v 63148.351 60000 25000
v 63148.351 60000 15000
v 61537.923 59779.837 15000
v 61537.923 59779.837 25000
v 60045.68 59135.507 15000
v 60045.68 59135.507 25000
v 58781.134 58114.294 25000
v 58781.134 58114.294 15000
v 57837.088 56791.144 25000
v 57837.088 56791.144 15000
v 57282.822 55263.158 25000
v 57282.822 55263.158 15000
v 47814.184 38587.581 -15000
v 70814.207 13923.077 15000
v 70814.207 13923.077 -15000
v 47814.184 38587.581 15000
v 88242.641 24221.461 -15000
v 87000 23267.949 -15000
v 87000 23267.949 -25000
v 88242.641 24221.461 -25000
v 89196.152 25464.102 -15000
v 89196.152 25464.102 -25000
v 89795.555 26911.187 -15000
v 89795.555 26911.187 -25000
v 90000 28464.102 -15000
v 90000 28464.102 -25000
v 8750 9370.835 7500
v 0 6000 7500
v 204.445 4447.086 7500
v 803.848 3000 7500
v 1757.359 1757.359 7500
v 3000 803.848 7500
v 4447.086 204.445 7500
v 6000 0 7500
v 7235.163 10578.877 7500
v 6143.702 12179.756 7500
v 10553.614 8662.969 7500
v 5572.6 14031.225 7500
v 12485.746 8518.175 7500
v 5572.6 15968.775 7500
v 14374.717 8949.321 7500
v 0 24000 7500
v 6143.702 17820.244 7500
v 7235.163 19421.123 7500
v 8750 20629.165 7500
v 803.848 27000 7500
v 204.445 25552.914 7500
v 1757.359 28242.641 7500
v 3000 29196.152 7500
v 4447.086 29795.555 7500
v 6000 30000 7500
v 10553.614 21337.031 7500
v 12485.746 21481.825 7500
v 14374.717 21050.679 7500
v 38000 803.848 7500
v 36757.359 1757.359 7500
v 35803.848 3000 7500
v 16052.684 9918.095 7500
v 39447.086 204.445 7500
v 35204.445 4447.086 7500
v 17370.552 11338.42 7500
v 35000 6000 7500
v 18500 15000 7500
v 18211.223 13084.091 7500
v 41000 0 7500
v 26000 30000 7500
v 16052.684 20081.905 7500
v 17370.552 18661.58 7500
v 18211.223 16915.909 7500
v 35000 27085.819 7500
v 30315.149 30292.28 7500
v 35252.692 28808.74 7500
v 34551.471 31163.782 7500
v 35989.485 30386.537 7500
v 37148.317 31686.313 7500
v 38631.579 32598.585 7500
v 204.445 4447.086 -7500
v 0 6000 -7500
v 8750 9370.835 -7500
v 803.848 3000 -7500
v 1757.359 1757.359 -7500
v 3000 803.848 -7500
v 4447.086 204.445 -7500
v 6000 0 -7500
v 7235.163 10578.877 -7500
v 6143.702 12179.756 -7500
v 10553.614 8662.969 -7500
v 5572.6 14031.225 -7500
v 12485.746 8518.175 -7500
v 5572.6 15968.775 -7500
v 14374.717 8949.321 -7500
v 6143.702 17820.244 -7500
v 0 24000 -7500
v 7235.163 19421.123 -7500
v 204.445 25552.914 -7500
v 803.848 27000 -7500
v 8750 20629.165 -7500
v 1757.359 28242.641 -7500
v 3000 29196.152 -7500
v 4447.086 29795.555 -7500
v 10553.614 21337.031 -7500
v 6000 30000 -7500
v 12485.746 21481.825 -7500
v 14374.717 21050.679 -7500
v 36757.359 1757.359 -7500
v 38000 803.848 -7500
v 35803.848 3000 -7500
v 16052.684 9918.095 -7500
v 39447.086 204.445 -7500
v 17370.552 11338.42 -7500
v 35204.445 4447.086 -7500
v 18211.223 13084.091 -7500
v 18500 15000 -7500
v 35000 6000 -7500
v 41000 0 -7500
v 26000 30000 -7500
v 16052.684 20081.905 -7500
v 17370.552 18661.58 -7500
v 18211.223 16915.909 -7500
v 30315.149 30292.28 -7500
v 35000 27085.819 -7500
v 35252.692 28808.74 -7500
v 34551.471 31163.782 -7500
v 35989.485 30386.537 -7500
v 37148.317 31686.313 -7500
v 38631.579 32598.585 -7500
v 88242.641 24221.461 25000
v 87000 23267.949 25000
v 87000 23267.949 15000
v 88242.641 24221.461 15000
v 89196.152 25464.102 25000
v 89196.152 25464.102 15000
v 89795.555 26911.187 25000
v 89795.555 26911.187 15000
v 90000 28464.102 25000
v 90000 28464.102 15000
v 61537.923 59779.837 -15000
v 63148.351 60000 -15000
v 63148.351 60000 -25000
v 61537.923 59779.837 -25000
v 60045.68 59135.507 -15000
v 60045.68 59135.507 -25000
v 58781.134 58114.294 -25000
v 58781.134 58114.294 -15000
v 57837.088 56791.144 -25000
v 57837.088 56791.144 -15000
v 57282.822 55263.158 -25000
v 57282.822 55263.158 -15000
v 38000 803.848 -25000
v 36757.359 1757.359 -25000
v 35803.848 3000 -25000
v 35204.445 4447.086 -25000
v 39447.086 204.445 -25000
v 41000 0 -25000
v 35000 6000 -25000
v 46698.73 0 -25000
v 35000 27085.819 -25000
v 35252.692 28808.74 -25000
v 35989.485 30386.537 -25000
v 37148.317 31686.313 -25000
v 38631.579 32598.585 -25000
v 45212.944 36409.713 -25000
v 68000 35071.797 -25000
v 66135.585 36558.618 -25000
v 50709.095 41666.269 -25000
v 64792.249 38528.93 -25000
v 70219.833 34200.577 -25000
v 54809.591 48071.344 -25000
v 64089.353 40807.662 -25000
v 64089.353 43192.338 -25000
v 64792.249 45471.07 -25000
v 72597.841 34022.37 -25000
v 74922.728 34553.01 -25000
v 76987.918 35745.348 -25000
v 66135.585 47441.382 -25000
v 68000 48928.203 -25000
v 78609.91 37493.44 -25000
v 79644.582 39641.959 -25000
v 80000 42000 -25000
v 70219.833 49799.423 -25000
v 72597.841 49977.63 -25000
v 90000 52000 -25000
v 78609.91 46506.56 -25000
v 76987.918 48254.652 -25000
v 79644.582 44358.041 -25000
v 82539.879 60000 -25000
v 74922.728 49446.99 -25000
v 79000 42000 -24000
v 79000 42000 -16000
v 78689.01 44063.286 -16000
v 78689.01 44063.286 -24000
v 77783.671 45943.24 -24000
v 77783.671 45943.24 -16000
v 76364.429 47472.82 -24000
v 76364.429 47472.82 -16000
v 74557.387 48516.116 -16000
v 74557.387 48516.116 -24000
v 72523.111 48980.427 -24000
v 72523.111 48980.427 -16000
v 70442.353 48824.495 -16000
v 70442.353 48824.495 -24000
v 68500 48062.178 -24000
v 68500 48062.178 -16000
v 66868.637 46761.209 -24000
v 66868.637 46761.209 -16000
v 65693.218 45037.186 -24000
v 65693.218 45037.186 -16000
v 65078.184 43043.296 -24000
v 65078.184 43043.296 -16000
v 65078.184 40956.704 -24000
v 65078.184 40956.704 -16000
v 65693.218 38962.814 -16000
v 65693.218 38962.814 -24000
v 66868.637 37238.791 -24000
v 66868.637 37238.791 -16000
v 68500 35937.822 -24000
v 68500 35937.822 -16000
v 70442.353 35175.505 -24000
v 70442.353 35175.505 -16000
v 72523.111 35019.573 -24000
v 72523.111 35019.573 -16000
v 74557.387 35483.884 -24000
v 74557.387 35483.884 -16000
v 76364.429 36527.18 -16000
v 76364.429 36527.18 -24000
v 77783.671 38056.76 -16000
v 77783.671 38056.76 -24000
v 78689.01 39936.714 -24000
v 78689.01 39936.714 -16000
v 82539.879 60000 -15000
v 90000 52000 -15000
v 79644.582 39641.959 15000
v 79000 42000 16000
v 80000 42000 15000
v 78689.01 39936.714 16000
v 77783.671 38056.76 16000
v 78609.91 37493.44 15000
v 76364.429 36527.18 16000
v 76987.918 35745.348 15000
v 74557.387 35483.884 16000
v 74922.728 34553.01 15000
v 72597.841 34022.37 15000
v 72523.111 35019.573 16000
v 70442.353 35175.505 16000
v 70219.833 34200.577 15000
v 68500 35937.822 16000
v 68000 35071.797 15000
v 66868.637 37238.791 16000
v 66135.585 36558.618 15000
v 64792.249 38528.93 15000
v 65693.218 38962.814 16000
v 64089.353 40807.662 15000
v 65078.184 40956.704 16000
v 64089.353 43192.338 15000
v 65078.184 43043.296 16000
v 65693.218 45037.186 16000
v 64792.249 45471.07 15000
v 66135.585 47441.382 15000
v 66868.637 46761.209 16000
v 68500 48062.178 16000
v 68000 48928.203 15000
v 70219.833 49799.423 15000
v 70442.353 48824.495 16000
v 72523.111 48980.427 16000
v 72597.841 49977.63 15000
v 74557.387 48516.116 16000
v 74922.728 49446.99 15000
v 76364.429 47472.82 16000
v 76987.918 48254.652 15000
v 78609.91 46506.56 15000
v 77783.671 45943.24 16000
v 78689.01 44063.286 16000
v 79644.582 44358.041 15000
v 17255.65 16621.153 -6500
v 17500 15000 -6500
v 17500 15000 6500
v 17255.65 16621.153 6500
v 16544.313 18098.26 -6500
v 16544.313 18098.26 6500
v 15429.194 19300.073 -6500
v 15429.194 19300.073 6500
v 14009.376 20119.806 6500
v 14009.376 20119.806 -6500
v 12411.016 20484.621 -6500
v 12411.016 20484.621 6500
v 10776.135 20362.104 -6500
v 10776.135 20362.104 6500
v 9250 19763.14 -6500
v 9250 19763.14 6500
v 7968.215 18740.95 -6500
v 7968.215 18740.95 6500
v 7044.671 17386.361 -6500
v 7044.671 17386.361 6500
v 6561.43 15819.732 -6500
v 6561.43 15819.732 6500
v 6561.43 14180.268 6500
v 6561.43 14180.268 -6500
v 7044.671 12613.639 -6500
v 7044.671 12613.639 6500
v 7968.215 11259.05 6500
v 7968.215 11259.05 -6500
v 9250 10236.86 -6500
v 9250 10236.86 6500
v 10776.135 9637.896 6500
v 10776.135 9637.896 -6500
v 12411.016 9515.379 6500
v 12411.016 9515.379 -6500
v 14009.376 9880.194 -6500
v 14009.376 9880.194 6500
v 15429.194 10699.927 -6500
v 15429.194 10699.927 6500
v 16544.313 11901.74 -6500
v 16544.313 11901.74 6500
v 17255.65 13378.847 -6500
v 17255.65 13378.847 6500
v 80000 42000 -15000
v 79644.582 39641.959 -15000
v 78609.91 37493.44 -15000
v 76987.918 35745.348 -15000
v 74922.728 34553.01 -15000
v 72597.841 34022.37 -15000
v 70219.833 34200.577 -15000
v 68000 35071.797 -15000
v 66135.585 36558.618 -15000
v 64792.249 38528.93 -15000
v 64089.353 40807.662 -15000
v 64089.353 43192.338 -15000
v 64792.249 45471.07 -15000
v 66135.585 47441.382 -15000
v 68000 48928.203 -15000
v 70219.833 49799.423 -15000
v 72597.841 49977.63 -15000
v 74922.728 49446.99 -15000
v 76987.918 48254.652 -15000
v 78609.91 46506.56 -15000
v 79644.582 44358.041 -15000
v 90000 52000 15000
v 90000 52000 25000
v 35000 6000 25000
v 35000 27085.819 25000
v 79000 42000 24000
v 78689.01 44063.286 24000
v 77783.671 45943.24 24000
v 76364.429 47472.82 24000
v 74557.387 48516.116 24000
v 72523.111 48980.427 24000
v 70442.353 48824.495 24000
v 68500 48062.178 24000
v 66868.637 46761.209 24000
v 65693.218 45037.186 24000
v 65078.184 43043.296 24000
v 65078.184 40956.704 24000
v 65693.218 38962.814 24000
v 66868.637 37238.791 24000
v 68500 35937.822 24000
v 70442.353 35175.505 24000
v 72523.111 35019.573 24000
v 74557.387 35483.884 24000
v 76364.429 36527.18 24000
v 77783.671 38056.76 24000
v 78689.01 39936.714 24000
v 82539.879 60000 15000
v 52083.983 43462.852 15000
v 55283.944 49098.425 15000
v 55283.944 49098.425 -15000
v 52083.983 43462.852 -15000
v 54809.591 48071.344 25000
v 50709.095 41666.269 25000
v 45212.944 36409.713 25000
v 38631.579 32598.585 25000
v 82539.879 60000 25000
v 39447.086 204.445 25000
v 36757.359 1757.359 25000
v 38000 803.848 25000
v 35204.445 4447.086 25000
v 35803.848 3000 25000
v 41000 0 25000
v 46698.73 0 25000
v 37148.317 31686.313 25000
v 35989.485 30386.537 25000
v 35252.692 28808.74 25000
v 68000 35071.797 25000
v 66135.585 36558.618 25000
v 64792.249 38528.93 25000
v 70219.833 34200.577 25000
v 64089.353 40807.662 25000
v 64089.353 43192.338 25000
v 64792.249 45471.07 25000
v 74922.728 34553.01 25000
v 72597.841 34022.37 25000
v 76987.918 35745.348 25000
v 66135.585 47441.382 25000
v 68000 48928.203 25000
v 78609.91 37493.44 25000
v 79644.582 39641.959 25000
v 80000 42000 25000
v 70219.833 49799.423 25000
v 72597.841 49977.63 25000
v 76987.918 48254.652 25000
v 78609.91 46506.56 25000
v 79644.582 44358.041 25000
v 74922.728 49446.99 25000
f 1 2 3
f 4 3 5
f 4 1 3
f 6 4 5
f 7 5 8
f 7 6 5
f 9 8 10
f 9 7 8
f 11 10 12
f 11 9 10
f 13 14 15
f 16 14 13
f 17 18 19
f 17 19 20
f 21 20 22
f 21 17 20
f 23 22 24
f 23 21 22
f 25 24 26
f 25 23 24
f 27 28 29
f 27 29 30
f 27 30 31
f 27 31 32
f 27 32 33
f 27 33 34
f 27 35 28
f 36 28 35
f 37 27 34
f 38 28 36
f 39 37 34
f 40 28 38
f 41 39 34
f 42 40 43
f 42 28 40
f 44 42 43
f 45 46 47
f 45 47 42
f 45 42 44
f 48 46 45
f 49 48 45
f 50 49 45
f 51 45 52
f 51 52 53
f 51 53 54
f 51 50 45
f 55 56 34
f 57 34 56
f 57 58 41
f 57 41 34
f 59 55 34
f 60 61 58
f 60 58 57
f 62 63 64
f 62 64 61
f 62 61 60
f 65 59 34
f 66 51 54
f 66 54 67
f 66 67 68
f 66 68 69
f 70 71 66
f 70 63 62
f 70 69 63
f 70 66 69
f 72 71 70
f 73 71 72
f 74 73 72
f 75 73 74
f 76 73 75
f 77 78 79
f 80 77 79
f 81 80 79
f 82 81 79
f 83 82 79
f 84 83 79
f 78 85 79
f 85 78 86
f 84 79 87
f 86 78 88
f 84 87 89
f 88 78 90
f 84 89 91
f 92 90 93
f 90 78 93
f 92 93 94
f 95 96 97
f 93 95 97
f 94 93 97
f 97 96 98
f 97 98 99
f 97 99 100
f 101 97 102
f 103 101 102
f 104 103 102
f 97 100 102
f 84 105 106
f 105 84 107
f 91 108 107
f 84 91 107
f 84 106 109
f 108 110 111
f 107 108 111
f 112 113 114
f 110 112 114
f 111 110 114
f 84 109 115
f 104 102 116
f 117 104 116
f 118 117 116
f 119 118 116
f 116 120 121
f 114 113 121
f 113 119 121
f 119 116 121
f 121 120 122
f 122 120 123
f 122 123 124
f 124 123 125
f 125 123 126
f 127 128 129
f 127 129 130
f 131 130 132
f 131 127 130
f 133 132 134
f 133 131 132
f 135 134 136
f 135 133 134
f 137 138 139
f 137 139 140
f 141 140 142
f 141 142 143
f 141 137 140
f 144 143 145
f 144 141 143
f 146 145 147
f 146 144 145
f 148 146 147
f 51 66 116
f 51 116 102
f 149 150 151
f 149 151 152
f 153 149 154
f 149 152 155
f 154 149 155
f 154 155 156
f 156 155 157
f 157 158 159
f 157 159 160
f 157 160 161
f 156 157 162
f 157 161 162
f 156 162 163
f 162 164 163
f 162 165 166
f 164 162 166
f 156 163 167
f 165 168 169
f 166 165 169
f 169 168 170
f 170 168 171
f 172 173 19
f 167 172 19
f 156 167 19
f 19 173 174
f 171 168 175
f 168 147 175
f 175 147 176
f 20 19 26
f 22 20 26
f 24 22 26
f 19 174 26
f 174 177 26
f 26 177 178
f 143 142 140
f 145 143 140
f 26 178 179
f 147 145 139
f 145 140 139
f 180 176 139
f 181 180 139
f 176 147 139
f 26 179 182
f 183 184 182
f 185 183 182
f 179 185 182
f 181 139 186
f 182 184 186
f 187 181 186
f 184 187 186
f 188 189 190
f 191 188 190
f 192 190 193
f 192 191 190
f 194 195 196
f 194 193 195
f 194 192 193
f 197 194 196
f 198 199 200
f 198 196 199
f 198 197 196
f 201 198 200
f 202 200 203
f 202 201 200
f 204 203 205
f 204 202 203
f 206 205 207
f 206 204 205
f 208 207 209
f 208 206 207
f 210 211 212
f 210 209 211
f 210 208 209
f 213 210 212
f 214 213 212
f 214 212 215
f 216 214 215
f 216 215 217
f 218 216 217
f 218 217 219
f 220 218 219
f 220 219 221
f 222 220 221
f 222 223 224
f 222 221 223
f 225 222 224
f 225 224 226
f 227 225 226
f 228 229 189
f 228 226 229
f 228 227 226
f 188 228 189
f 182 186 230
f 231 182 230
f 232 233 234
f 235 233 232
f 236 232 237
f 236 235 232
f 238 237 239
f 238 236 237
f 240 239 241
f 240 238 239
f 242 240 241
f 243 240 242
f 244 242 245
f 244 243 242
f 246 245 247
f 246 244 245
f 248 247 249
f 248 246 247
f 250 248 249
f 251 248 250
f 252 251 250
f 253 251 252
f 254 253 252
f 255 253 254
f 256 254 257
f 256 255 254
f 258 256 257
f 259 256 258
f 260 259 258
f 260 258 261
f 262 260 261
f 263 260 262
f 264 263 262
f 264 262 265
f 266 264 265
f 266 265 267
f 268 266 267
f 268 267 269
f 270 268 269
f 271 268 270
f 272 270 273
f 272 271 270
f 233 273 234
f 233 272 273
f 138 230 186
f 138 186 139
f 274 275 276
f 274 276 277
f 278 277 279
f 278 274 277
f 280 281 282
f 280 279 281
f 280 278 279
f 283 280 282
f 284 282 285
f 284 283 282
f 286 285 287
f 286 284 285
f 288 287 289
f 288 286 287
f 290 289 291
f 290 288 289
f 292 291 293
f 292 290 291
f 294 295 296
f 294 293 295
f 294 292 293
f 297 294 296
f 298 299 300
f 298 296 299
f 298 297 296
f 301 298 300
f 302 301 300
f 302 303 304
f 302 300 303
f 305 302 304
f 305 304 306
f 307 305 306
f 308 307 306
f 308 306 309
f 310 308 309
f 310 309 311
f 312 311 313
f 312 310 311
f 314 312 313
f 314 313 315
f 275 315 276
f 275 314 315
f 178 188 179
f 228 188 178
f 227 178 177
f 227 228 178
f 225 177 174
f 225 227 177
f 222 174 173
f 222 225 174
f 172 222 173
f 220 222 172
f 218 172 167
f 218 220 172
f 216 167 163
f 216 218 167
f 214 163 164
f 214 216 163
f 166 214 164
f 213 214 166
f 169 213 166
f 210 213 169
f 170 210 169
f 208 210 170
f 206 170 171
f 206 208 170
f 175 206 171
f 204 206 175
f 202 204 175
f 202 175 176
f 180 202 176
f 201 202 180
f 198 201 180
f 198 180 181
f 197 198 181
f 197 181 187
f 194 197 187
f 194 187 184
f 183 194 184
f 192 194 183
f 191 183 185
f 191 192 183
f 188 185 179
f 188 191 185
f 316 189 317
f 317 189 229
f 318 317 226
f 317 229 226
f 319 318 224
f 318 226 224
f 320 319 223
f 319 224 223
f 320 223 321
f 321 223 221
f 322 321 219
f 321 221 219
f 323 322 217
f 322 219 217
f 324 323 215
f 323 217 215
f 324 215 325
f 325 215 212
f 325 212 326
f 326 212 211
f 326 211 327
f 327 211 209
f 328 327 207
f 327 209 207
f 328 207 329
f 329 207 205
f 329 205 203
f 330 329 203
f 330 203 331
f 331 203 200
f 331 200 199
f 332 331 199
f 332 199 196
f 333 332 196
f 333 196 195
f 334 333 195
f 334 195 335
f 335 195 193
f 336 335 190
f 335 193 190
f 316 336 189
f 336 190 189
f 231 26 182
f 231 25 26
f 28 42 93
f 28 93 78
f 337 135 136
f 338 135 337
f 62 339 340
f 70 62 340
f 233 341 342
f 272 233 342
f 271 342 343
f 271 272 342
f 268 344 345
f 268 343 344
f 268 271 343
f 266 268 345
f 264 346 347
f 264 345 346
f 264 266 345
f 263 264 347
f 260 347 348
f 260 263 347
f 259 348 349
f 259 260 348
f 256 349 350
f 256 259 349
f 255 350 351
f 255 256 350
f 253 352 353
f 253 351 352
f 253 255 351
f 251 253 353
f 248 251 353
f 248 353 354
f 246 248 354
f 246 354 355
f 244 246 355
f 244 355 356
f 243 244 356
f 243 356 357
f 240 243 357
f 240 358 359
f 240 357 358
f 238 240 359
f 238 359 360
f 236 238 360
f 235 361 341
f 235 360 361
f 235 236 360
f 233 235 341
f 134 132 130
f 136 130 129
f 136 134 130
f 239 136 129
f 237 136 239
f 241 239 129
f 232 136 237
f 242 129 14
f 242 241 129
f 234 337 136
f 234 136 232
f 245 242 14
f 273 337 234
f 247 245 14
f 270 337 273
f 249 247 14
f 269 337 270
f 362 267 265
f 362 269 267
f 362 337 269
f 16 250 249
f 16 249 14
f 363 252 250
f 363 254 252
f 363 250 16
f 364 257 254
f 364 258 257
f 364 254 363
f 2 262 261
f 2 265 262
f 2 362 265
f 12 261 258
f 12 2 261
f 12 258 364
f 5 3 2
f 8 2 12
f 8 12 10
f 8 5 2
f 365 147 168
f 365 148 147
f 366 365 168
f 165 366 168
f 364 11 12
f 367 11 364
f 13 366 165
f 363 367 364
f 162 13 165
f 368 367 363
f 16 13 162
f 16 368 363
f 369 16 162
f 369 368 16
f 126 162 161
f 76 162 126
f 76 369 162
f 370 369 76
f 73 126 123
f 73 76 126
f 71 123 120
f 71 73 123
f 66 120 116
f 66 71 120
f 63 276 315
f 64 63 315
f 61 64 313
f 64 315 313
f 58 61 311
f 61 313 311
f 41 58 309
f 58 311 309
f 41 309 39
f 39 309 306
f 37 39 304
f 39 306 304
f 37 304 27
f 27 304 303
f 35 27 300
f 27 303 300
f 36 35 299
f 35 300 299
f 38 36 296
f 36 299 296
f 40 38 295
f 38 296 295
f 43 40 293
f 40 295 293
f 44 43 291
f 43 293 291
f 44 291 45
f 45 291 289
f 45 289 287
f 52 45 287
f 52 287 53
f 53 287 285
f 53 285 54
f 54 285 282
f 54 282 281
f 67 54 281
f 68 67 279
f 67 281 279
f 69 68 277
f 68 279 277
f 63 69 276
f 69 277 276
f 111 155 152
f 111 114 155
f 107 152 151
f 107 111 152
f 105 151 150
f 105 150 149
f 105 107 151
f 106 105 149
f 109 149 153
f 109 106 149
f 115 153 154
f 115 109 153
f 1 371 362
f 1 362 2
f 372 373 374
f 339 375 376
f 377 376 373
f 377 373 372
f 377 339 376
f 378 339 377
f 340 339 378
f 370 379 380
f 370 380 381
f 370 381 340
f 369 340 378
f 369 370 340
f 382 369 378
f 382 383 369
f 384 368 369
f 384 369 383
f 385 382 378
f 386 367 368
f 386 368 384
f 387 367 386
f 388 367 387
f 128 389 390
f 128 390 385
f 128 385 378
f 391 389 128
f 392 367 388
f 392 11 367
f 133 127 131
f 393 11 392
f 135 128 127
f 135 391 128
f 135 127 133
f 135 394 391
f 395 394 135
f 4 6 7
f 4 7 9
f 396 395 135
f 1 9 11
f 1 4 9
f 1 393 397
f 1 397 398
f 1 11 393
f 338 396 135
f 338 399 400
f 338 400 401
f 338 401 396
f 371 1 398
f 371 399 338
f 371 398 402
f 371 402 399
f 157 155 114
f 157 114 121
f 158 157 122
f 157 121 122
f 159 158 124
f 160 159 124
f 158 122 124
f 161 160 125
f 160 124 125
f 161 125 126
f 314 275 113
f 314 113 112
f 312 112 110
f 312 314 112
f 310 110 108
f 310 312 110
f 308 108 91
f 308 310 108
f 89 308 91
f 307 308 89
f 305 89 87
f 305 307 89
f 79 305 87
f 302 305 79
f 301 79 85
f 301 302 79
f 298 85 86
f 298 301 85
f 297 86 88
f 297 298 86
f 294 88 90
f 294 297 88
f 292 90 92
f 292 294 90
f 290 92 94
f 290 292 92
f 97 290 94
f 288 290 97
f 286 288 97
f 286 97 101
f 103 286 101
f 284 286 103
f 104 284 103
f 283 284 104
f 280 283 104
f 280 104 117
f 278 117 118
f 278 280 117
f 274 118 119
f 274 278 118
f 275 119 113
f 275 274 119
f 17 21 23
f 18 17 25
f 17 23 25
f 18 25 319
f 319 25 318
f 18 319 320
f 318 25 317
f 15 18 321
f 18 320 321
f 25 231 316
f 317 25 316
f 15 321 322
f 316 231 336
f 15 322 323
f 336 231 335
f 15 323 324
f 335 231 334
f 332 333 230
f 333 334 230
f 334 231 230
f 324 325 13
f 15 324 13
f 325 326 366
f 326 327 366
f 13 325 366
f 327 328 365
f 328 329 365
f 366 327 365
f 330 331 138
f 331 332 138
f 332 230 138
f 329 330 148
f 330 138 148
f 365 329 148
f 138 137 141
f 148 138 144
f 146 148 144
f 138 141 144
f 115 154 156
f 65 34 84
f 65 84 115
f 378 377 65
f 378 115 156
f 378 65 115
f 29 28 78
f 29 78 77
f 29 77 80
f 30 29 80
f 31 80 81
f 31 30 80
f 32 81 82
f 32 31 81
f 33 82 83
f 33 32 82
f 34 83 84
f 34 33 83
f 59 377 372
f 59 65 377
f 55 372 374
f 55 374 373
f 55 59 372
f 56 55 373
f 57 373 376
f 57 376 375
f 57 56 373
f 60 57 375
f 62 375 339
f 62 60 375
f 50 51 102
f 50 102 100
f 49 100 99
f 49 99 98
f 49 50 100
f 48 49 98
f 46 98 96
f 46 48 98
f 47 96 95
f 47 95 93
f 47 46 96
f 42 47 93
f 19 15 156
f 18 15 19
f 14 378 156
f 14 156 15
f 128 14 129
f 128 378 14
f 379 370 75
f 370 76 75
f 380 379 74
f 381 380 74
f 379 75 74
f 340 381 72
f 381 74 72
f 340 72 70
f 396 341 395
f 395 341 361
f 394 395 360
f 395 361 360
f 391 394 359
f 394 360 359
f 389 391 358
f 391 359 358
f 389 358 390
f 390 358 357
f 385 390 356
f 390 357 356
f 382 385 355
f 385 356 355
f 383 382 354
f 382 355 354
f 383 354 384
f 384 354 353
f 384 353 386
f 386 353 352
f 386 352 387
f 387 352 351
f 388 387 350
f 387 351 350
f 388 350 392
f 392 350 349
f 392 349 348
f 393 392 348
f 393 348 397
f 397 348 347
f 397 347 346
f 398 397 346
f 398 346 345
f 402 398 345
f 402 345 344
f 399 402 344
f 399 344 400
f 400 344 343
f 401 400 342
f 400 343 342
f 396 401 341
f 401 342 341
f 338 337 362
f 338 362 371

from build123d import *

# Parameters (mm, degrees)
BOSS_EXTRUDE1_DEPTH     = 25000
CHAMFER1_SIZE           = 8000
CHAMFER1_SIZE2          = 7460.120689101317
CUT_EXTRUDE1_DEPTH      = 15000
CUT_EXTRUDE2_DEPTH      = 17500
FILLET1_R               = 6000
CUT_EXTRUDE3_DEPTH      = 112944.56998076734
CUT_EXTRUDE3_DEPTH_BACK = 112944.56998076734
SKETCH6_R               = 5500.000000000001
CUT_EXTRUDE4_DEPTH      = 119164.7528781319
CUT_EXTRUDE4_DEPTH_BACK = 119164.7528781319
SKETCH7_R               = 7000.000000000006
CHAMFER2_SIZE           = 1000
CHAMFER3_SIZE           = 1000
FILLET2_R               = 6000


with BuildPart() as part:
    # Sketch1 → Boss-Extrude1 (new, symmetric)
    with BuildSketch(Plane.XY):
        with BuildLine():
            Line((-6.7599e-13, 23999.999999999956), (-1.69e-13, 6000.000000000043))
            ThreePointArc((-1.69e-13, 6000.000000000043), (1757.3593128807133, 1757.3593128807152), (6000.000000000043, 0))
            Line((6000.000000000043, 0), (46698.72981077821, 0))
            Line((46698.72981077821, 0), (86999.99999999999, 23267.949192431108))
            ThreePointArc((86999.99999999999, 23267.949192431108), (89196.15242270664, 25464.101615137755), (90000, 28464.101615137777))
            Line((90000, 28464.101615137777), (90000, 60000))
            Line((90000, 60000), (63148.35124201342, 59999.99999999999))
            ThreePointArc((63148.35124201342, 59999.99999999999), (59378.66606738816, 58667.919631292985), (57282.82209853761, 55263.15789473683))
            ThreePointArc((57282.82209853761, 55263.15789473683), (46104.987598001375, 37104.42863310402), (25999.999999999993, 30000))
            Line((25999.999999999993, 30000), (6000.000000000042, 30000))
            ThreePointArc((6000.000000000042, 30000), (1757.3593128807124, 28242.640687119285), (-6.7599e-13, 23999.999999999956))
        make_face()
    extrude(amount=BOSS_EXTRUDE1_DEPTH, both=True)

    # Chamfer1
    chamfer1_edges = [part.edges().sort_by_distance(p)[0] for p in [
        (90000, 60000, 0),
    ]]
    chamfer1_side = [part.faces().sort_by_distance(p)[0] for p in [
        (90000, 44232.050807568885, -1.1813e-13),
    ]]
    chamfer(chamfer1_edges, length=CHAMFER1_SIZE, length2=CHAMFER1_SIZE2, reference=chamfer1_side[0])

    # Sketch4 → Cut-Extrude1 (cut, symmetric)
    with BuildSketch(Plane.XY):
        with BuildLine():
            Line((70814.20664708655, 13923.077043078853), (47814.18446750665, 38587.581158334135))
            ThreePointArc((47814.18446750665, 38587.581158334135), (53826.99662991948, 46199.4222080821), (57282.82209853761, 55263.15789473681))
            ThreePointArc((57282.82209853761, 55263.15789473681), (59378.66606738815, 58667.919631292985), (63148.35124201342, 60000))
            Line((63148.35124201342, 60000), (82539.87931089872, 60000))
            Line((82539.87931089872, 60000), (90000, 51999.99999999997))
            Line((90000, 51999.99999999997), (90000, 28464.101615137777))
            ThreePointArc((90000, 28464.101615137777), (89196.15242270664, 25464.101615137755), (86999.99999999999, 23267.949192431108))
            Line((86999.99999999999, 23267.949192431108), (70814.20664708655, 13923.077043078853))
        make_face()
    extrude(amount=CUT_EXTRUDE1_DEPTH, both=True, mode=Mode.SUBTRACT)

    # Sketch5 → Cut-Extrude2 (cut)
    with BuildSketch(Plane.XY.offset(25000)):
        with BuildLine():
            Line((35000, 0), (35000, 31291.694934431827))
            ThreePointArc((35000, 31291.694934431827), (30546.11031002429, 30324.56975747463), (25999.99999999999, 30000))
            Line((25999.99999999999, 30000), (6000.000000000041, 30000))
            ThreePointArc((6000.000000000041, 30000), (1757.3593128807133, 28242.640687119285), (-1.77636e-12, 23999.999999999956))
            Line((-1.77636e-12, 23999.999999999956), (0, 6000.000000000043))
            ThreePointArc((0, 6000.000000000043), (1757.3593128807133, 1757.3593128807152), (6000.000000000041, 0))
            Line((6000.000000000041, 0), (35000, 0))
        make_face()
    cut_extrude2 = extrude(amount=-CUT_EXTRUDE2_DEPTH, mode=Mode.SUBTRACT)

    # Mirror2: Cut-Extrude2 across plane
    add(cut_extrude2.mirror(Plane.XY), mode=Mode.SUBTRACT)

    # Fillet1
    fillet1_edges = [part.edges().sort_by_distance(p)[0] for p in [
        (35000, 0, 16250),
        (35000, 31291.694934431827, 16250),
    ]]
    fillet(fillet1_edges, radius=FILLET1_R)

    # Sketch6 → Cut-Extrude3 (cut, two sides: drawn at the far end of the back side and taken through both)
    with BuildSketch(Plane.XY.offset(7500).offset(-CUT_EXTRUDE3_DEPTH_BACK)):
        with Locations((11999.999999999998, 15000)):
            Circle(SKETCH6_R)
    extrude(amount=CUT_EXTRUDE3_DEPTH + CUT_EXTRUDE3_DEPTH_BACK, mode=Mode.SUBTRACT)

    # Sketch7 → Cut-Extrude4 (cut, two sides: drawn at the far end of the back side and taken through both)
    with BuildSketch(Plane.XY.offset(25000).offset(-CUT_EXTRUDE4_DEPTH_BACK)):
        with Locations((72000, 42000)):
            Circle(SKETCH7_R)
    extrude(amount=CUT_EXTRUDE4_DEPTH + CUT_EXTRUDE4_DEPTH_BACK, mode=Mode.SUBTRACT)

    # Chamfer2
    chamfer2_edges = [part.edges().sort_by_distance(p)[0] for p in [
        (6499.999999999997, 15000, 7500),
        (64999.99999999999, 42000, 25000),
        (64999.99999999999, 42000, 15000),
    ]]
    chamfer(chamfer2_edges, length=CHAMFER2_SIZE)

    # Chamfer3
    chamfer3_edges = [part.edges().sort_by_distance(p)[0] for p in [
        (6499.999999999997, 15000, -7500),
        (64999.99999999999, 42000, -15000),
        (64999.99999999999, 42000, -25000),
    ]]
    chamfer(chamfer3_edges, length=CHAMFER3_SIZE)

    # Fillet2
    fillet2_edges = [part.edges().sort_by_distance(p)[0] for p in [
        (35000, 0, -16250),
        (35000, 31291.694934431827, -16250),
    ]]
    fillet(fillet2_edges, radius=FILLET2_R)


solid = part.part
